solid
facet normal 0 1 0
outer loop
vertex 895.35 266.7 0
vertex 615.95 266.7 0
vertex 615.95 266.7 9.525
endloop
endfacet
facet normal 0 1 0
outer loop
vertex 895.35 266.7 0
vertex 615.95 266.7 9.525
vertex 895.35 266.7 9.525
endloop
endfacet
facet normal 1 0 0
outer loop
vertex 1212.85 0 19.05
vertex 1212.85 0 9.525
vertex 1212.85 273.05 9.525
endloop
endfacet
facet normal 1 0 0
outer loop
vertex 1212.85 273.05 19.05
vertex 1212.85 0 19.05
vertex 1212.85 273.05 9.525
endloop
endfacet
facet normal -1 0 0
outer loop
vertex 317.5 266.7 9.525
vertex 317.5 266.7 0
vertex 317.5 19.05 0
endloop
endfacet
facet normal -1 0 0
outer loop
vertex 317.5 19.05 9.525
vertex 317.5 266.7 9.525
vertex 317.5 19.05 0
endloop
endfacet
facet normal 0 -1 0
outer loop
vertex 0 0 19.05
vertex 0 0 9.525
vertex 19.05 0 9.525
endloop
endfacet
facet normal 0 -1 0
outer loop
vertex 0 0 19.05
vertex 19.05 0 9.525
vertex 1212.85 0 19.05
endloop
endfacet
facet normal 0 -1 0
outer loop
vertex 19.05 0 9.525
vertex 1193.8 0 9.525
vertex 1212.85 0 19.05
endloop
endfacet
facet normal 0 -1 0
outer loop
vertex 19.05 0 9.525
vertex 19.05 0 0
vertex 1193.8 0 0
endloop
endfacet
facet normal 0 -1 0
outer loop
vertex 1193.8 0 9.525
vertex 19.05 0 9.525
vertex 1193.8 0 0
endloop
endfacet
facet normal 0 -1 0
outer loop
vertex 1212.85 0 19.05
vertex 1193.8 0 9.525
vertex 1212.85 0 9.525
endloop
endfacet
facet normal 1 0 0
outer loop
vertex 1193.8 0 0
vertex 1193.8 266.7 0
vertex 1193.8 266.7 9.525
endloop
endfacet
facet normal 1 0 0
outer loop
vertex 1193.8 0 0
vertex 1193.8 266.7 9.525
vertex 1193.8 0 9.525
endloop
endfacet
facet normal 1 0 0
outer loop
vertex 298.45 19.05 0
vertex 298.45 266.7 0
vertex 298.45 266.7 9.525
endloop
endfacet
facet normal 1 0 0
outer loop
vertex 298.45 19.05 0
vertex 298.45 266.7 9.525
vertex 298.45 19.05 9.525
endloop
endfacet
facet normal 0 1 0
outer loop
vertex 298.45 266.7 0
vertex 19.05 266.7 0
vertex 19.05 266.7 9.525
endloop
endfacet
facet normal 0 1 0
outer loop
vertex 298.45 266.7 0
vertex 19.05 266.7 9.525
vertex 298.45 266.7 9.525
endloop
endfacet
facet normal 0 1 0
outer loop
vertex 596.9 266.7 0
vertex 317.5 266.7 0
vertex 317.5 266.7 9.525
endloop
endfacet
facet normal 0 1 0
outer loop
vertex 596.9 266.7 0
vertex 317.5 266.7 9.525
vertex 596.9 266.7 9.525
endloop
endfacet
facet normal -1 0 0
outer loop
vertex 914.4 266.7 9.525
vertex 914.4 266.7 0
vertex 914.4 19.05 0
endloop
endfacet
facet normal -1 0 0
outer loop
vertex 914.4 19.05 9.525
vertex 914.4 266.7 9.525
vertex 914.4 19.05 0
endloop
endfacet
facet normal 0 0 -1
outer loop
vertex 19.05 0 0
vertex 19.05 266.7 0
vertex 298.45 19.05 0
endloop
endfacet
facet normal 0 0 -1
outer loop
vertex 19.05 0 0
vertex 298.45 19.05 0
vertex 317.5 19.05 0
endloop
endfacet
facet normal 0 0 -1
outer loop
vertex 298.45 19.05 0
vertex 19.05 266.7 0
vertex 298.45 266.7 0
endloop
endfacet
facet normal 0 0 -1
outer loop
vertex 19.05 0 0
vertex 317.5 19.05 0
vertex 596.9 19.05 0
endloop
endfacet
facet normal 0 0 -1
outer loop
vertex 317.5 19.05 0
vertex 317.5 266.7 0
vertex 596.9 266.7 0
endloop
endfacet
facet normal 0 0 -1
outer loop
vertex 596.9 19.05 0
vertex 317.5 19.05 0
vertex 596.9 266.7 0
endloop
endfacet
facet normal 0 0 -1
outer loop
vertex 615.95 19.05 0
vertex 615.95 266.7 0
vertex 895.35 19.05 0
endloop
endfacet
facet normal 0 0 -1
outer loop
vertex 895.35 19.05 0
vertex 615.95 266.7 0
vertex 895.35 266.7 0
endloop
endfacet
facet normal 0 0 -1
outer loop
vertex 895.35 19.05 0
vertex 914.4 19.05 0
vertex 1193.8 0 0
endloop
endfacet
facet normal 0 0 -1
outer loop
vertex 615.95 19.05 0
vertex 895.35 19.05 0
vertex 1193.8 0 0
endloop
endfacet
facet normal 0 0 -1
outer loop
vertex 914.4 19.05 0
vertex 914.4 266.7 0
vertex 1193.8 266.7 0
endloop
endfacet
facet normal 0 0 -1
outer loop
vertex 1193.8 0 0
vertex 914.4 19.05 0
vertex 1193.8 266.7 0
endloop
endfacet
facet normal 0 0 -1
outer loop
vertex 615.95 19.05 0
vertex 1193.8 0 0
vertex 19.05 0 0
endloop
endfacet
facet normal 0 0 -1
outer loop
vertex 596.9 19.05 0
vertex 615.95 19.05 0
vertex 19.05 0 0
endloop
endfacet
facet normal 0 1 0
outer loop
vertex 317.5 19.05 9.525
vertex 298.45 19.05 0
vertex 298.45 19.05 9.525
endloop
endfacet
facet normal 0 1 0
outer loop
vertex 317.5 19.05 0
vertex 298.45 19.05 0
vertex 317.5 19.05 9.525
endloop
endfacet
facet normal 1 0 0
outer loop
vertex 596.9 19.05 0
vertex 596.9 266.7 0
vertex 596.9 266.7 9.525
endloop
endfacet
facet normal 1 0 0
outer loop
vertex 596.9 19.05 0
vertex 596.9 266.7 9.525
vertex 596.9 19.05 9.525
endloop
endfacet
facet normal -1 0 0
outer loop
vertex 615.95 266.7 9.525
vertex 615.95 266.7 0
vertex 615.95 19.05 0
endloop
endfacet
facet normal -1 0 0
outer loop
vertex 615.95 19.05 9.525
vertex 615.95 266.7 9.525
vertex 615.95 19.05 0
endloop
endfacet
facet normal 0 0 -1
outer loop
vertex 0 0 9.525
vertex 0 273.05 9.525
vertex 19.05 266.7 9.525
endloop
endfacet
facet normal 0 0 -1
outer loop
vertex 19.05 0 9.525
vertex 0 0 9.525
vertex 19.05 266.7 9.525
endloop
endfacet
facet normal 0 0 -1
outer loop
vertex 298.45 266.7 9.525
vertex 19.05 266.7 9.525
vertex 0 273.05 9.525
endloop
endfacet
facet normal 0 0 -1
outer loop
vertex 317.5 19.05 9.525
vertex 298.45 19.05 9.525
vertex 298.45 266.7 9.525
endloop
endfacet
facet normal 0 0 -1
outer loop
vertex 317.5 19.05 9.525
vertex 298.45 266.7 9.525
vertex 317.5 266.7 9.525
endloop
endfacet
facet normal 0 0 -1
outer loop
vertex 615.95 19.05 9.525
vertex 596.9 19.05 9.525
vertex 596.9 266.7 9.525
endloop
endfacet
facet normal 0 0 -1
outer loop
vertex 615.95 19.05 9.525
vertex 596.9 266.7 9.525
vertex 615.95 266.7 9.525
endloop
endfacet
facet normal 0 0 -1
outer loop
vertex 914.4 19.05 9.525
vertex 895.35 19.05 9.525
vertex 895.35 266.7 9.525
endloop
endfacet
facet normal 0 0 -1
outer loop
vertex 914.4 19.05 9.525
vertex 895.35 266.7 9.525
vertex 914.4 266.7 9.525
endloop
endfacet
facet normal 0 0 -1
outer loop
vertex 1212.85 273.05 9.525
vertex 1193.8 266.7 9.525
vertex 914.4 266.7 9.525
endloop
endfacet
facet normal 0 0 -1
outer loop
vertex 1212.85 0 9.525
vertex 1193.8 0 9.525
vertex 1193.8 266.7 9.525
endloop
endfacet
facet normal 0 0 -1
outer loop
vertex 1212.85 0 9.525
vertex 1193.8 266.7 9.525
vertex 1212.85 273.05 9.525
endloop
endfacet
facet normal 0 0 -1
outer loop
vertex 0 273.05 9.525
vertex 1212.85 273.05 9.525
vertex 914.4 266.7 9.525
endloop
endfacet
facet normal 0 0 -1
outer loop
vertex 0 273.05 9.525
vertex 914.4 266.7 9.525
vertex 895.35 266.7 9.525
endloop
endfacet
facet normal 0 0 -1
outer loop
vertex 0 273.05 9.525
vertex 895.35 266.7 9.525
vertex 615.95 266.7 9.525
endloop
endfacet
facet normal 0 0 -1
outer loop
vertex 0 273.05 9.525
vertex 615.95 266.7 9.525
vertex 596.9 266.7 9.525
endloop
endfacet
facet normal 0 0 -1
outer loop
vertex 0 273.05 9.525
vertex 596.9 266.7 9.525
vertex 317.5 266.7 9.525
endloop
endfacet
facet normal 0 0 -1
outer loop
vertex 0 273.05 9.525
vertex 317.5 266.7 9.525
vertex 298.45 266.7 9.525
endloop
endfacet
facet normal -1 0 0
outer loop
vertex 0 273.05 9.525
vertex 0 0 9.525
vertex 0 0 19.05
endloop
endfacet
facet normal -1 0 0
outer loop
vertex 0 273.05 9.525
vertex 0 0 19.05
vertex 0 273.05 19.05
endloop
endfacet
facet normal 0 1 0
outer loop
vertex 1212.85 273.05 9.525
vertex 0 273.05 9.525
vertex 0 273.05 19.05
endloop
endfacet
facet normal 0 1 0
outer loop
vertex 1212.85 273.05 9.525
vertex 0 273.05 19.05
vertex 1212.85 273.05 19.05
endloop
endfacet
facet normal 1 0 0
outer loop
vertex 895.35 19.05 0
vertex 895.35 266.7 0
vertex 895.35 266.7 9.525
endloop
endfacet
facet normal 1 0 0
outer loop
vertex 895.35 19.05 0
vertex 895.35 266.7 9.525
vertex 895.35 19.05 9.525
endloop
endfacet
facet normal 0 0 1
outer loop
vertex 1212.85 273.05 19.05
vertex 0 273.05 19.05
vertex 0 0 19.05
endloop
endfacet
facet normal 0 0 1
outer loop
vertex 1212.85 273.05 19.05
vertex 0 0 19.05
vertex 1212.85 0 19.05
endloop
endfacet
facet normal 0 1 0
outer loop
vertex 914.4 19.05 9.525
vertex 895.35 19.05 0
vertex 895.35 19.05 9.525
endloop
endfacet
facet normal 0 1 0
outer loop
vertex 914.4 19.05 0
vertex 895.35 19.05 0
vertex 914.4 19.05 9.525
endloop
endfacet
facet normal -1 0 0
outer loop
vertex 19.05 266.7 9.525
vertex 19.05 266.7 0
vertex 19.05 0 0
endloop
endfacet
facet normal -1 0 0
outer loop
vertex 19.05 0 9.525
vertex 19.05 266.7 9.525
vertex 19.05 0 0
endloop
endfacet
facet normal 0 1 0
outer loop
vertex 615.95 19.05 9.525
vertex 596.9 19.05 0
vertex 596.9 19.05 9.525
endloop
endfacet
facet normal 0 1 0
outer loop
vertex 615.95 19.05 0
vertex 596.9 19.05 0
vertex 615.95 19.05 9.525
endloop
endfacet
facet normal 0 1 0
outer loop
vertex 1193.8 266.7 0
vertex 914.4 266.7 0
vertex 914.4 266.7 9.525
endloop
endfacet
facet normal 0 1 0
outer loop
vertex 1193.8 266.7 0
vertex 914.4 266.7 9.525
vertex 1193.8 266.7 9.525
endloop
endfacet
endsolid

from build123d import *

# Parameters (mm, degrees)
F0_W     = 1212.85
F0_H     = 273.05
F1_DEPTH = 19.05
F2_W     = 19.05
F2_H     = 273.05
F2_H_2   = 254
F3_DEPTH = 9.525
F4_W     = 1174.75
F4_H     = 6.35
F5_DEPTH = 9.525


with BuildPart() as f1:
    # F0 (on Top) → F1 (new body)
    with BuildSketch(Plane.XY):
        with Locations((606.425, 136.525)):
            Rectangle(F0_W, F0_H)
    extrude(amount=F1_DEPTH)

    # F2 (on face) → F3 (cut)
    with BuildSketch(Plane(origin=(0, 0, 0), x_dir=(1, 0, 0), z_dir=(0, 0, -1))):
        with Locations((9.525, -136.525)):
            Rectangle(F2_W, F2_H)
        with Locations((307.975, -146.05)):
            Rectangle(F2_W, F2_H_2)
        with Locations((606.425, -146.05)):
            Rectangle(F2_W, F2_H_2)
        with Locations((904.875, -146.05)):
            Rectangle(F2_W, F2_H_2)
        with Locations((1203.325, -136.525)):
            Rectangle(F2_W, F2_H)
    extrude(amount=-F3_DEPTH, mode=Mode.SUBTRACT)

    # F4 (on face) → F5 (cut)
    with BuildSketch(Plane(origin=(0, 0, 0), x_dir=(1, 0, 0), z_dir=(0, 0, -1))):
        with Locations((606.425, -269.875)):
            Rectangle(F4_W, F4_H)
    extrude(amount=-F5_DEPTH, mode=Mode.SUBTRACT)


solid = f1.part
